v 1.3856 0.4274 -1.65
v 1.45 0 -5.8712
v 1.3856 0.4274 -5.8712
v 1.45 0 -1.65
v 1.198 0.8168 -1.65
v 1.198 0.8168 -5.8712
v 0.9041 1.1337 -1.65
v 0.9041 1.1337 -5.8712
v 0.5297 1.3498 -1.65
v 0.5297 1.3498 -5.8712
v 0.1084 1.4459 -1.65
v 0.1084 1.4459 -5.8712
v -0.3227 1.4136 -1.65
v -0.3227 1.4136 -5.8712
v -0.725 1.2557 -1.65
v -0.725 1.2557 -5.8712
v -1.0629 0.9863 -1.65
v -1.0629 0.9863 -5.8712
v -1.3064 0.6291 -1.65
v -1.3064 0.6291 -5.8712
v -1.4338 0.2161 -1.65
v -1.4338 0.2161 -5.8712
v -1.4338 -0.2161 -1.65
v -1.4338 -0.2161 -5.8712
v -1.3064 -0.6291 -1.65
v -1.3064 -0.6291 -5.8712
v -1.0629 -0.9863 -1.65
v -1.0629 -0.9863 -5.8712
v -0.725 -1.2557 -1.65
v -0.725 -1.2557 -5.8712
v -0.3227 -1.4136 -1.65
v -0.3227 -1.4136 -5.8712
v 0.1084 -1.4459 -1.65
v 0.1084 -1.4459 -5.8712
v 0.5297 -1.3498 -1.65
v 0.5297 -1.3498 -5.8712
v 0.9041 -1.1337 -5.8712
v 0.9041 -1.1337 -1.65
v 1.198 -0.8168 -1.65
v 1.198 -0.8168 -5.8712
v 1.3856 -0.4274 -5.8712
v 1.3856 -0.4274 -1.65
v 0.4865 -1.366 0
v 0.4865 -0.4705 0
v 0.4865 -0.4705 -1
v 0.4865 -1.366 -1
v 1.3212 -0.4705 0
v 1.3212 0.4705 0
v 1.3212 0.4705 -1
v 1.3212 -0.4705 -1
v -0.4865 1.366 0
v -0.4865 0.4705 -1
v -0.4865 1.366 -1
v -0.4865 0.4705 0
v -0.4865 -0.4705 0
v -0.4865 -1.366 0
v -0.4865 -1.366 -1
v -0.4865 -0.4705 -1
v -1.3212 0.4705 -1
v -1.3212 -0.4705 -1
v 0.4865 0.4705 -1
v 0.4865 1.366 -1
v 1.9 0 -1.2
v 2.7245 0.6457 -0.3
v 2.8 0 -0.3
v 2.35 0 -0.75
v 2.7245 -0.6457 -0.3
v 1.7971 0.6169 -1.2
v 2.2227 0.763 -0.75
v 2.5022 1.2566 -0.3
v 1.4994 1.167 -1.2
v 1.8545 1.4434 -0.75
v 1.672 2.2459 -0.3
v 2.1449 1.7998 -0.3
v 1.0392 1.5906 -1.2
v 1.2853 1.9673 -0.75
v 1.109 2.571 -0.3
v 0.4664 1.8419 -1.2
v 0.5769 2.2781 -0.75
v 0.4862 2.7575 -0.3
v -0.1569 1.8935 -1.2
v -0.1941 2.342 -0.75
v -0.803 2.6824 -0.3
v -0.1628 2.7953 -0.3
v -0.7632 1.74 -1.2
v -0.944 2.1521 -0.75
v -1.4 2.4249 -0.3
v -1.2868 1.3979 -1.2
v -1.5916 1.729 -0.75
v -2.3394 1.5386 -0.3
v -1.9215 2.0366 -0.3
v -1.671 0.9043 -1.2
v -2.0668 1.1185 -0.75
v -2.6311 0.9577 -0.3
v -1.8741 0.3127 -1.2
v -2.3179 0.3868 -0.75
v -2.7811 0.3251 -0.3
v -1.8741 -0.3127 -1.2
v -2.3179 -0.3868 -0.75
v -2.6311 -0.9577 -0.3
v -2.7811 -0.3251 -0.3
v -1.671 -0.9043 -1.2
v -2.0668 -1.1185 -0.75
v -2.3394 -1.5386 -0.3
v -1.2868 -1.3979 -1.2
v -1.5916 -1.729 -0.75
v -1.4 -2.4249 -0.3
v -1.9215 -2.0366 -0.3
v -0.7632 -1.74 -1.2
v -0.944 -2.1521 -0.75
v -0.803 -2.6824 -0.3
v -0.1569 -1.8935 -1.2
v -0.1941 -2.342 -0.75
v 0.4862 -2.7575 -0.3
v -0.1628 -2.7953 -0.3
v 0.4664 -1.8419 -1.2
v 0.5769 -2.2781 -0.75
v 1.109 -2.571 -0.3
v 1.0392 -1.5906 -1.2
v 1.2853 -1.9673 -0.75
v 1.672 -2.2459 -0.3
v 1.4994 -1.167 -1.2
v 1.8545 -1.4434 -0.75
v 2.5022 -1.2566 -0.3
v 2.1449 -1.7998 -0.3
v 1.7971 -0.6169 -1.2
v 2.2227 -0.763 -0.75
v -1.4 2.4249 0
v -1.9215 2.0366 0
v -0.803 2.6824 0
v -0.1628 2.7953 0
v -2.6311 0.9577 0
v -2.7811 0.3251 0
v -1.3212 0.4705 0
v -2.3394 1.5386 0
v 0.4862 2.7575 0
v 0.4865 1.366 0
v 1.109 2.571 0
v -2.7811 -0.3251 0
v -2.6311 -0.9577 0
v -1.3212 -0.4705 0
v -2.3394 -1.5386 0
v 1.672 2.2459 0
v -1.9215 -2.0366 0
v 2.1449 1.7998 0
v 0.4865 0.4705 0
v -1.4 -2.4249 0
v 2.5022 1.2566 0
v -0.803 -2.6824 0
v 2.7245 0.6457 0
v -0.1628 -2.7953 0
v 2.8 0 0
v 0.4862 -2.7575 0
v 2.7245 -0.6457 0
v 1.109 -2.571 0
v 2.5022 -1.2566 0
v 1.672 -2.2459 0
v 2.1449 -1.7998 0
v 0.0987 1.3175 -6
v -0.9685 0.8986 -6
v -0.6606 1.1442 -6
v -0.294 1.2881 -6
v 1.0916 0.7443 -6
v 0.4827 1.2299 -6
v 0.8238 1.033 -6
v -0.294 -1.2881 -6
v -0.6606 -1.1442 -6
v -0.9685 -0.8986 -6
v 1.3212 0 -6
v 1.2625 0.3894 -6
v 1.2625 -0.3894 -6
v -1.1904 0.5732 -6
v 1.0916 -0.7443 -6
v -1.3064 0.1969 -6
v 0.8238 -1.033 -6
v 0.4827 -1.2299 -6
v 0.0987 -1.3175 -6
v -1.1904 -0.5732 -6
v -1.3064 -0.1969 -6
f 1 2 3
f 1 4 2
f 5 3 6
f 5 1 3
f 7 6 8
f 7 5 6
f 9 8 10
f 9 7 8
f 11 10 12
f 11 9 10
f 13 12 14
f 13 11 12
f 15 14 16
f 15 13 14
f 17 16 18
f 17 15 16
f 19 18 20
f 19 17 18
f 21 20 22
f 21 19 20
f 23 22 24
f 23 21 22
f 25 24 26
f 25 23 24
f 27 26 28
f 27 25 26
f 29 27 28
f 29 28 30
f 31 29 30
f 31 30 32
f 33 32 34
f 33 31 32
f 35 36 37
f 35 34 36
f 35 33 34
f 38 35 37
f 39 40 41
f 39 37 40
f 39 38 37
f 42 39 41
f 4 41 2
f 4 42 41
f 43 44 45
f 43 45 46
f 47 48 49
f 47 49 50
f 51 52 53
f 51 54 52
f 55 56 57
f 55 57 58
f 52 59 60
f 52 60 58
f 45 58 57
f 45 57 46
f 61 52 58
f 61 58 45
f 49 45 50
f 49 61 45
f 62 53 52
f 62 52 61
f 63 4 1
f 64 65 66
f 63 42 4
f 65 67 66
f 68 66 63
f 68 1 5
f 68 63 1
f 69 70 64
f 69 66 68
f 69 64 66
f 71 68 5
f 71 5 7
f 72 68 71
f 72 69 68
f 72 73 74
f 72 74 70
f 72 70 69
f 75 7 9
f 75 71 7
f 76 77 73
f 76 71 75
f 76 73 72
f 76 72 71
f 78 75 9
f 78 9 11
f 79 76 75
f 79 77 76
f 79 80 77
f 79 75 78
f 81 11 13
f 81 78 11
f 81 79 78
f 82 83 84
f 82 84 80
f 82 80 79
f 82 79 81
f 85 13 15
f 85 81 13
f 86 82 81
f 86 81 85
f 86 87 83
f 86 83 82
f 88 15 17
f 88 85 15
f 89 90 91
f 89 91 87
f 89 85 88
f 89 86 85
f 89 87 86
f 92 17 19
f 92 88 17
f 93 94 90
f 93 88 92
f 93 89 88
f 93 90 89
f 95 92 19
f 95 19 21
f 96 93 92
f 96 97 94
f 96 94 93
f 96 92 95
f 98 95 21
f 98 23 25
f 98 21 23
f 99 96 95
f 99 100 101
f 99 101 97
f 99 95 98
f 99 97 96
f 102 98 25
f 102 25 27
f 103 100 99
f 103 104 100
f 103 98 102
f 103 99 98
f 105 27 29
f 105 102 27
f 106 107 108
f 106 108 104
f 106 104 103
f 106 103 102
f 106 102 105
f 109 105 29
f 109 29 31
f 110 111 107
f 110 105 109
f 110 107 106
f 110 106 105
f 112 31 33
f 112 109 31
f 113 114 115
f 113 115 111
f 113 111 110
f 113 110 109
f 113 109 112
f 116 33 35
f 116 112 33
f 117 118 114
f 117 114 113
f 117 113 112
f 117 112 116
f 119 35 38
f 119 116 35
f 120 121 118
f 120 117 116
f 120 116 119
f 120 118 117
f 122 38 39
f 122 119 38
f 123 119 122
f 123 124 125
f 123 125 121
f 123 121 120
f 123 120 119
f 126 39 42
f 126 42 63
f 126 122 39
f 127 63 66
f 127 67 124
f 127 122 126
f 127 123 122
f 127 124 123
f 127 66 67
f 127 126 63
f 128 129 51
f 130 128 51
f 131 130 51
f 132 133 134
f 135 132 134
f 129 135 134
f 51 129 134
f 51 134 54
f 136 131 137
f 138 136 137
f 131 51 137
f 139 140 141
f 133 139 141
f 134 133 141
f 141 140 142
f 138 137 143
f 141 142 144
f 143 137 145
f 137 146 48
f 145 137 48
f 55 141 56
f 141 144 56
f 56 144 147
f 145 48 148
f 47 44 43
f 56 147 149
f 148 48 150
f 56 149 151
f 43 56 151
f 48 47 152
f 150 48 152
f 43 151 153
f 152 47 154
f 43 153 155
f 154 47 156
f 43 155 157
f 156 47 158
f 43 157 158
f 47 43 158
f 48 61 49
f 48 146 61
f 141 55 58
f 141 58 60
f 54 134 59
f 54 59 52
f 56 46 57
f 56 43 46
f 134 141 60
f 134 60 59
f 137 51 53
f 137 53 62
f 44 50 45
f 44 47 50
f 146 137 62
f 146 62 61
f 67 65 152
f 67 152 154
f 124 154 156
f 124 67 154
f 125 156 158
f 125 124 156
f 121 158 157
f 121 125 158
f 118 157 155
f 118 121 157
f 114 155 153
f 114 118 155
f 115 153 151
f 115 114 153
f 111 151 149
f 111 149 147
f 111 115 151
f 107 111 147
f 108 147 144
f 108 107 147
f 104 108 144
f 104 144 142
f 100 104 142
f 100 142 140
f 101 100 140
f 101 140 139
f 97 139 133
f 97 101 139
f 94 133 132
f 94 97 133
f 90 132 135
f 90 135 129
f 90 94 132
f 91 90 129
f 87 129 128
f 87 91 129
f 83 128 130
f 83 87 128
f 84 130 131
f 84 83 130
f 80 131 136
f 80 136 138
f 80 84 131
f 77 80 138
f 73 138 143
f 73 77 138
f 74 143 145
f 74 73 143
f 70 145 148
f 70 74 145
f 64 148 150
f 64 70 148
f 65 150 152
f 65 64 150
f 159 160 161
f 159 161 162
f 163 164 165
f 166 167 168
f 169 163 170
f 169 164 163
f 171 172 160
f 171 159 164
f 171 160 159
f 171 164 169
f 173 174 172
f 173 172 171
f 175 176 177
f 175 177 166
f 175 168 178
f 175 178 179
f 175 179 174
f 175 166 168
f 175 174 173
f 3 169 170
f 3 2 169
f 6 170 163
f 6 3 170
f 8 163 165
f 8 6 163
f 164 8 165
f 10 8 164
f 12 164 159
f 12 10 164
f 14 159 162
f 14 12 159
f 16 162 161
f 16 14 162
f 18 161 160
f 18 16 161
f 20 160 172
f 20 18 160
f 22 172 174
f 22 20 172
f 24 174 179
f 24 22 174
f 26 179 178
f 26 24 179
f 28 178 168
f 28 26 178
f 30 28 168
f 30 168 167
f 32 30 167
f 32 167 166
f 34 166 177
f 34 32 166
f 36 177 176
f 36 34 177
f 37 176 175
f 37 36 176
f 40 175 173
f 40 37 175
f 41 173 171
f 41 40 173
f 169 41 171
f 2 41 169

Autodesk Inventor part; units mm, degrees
ref_plane "YZ Plane" through (0, 0, 0) normal (1, 0, 0) x (0, 1, 0)
ref_plane "XZ Plane" through (0, 0, 0) normal (0, 1, 0) x (-1, 0, 0)
ref_plane "XY Plane" through (0, 0, 0) normal (0, 0, 1) x (1, 0, 0)
sketch "Эскиз1" plane through (0, 0, 0) normal (0, 1, 0) x (-1, 0, 0)
  line L0 (0, 0) -> (-2.8, 0)
  line L1 (0, 0) -> (0, -6)
  line L2 (0, -6) -> (-1.3212, -6)
  line L3 (-1.45, -5.8712) -> (-1.45, -1.65)
  line L4 (-2.8, -0.3) -> (-1.45, -1.65)
  line L5 (-2.8, 0) -> (-2.8, -0.3)
  line L6 (-1.45, -5.8712) -> (-1.3212, -6)
revolve "Вращение1" add sketch "Эскиз1" angle 360 about axis through (0, 0, 0) along (0, 0, -1)
sketch "Эскиз2" plane through (0, 0, 0) normal (0, 0, 1) x (1, 0, 0)
  line L0 (-1.3212, -0.4705) -> (-1.3212, 0.4705)
  line L1 (1.3212, 0.4705) -> (1.3212, -0.4705)
  circle A0 centre (0, 0) radius 1.45 projected
  line L2 (0.4865, -1.366) -> (-0.4865, -1.366)
  line L3 (-0.4865, 1.366) -> (0.4865, 1.366)
  line L4 (1.3212, -0.4705) -> (0.4865, -0.4705)
  line L5 (-0.4865, -0.4705) -> (-1.3212, -0.4705)
  line L6 (-0.4865, -1.366) -> (-0.4865, -0.4705)
  line L7 (-0.4865, 0.4705) -> (-0.4865, 1.366)
  line L8 (-1.3212, 0.4705) -> (-0.4865, 0.4705)
  line L9 (0.4865, 0.4705) -> (1.3212, 0.4705)
  line L10 (0.4865, 1.366) -> (0.4865, 0.4705)
  line L11 (0.4865, -0.4705) -> (0.4865, -1.366)
extrude "Выдавливание1" cut sketch "Эскиз2" against normal blind 1 contours L0 L8 L7 L3 L10 L9 L1 L4 L11 L2 L6 L5
thread "Резьба1" size "M3x0.5" class "6g" standard "ANSI Metric M Profile" full length
properties part number "Винт М3х6 пот"
